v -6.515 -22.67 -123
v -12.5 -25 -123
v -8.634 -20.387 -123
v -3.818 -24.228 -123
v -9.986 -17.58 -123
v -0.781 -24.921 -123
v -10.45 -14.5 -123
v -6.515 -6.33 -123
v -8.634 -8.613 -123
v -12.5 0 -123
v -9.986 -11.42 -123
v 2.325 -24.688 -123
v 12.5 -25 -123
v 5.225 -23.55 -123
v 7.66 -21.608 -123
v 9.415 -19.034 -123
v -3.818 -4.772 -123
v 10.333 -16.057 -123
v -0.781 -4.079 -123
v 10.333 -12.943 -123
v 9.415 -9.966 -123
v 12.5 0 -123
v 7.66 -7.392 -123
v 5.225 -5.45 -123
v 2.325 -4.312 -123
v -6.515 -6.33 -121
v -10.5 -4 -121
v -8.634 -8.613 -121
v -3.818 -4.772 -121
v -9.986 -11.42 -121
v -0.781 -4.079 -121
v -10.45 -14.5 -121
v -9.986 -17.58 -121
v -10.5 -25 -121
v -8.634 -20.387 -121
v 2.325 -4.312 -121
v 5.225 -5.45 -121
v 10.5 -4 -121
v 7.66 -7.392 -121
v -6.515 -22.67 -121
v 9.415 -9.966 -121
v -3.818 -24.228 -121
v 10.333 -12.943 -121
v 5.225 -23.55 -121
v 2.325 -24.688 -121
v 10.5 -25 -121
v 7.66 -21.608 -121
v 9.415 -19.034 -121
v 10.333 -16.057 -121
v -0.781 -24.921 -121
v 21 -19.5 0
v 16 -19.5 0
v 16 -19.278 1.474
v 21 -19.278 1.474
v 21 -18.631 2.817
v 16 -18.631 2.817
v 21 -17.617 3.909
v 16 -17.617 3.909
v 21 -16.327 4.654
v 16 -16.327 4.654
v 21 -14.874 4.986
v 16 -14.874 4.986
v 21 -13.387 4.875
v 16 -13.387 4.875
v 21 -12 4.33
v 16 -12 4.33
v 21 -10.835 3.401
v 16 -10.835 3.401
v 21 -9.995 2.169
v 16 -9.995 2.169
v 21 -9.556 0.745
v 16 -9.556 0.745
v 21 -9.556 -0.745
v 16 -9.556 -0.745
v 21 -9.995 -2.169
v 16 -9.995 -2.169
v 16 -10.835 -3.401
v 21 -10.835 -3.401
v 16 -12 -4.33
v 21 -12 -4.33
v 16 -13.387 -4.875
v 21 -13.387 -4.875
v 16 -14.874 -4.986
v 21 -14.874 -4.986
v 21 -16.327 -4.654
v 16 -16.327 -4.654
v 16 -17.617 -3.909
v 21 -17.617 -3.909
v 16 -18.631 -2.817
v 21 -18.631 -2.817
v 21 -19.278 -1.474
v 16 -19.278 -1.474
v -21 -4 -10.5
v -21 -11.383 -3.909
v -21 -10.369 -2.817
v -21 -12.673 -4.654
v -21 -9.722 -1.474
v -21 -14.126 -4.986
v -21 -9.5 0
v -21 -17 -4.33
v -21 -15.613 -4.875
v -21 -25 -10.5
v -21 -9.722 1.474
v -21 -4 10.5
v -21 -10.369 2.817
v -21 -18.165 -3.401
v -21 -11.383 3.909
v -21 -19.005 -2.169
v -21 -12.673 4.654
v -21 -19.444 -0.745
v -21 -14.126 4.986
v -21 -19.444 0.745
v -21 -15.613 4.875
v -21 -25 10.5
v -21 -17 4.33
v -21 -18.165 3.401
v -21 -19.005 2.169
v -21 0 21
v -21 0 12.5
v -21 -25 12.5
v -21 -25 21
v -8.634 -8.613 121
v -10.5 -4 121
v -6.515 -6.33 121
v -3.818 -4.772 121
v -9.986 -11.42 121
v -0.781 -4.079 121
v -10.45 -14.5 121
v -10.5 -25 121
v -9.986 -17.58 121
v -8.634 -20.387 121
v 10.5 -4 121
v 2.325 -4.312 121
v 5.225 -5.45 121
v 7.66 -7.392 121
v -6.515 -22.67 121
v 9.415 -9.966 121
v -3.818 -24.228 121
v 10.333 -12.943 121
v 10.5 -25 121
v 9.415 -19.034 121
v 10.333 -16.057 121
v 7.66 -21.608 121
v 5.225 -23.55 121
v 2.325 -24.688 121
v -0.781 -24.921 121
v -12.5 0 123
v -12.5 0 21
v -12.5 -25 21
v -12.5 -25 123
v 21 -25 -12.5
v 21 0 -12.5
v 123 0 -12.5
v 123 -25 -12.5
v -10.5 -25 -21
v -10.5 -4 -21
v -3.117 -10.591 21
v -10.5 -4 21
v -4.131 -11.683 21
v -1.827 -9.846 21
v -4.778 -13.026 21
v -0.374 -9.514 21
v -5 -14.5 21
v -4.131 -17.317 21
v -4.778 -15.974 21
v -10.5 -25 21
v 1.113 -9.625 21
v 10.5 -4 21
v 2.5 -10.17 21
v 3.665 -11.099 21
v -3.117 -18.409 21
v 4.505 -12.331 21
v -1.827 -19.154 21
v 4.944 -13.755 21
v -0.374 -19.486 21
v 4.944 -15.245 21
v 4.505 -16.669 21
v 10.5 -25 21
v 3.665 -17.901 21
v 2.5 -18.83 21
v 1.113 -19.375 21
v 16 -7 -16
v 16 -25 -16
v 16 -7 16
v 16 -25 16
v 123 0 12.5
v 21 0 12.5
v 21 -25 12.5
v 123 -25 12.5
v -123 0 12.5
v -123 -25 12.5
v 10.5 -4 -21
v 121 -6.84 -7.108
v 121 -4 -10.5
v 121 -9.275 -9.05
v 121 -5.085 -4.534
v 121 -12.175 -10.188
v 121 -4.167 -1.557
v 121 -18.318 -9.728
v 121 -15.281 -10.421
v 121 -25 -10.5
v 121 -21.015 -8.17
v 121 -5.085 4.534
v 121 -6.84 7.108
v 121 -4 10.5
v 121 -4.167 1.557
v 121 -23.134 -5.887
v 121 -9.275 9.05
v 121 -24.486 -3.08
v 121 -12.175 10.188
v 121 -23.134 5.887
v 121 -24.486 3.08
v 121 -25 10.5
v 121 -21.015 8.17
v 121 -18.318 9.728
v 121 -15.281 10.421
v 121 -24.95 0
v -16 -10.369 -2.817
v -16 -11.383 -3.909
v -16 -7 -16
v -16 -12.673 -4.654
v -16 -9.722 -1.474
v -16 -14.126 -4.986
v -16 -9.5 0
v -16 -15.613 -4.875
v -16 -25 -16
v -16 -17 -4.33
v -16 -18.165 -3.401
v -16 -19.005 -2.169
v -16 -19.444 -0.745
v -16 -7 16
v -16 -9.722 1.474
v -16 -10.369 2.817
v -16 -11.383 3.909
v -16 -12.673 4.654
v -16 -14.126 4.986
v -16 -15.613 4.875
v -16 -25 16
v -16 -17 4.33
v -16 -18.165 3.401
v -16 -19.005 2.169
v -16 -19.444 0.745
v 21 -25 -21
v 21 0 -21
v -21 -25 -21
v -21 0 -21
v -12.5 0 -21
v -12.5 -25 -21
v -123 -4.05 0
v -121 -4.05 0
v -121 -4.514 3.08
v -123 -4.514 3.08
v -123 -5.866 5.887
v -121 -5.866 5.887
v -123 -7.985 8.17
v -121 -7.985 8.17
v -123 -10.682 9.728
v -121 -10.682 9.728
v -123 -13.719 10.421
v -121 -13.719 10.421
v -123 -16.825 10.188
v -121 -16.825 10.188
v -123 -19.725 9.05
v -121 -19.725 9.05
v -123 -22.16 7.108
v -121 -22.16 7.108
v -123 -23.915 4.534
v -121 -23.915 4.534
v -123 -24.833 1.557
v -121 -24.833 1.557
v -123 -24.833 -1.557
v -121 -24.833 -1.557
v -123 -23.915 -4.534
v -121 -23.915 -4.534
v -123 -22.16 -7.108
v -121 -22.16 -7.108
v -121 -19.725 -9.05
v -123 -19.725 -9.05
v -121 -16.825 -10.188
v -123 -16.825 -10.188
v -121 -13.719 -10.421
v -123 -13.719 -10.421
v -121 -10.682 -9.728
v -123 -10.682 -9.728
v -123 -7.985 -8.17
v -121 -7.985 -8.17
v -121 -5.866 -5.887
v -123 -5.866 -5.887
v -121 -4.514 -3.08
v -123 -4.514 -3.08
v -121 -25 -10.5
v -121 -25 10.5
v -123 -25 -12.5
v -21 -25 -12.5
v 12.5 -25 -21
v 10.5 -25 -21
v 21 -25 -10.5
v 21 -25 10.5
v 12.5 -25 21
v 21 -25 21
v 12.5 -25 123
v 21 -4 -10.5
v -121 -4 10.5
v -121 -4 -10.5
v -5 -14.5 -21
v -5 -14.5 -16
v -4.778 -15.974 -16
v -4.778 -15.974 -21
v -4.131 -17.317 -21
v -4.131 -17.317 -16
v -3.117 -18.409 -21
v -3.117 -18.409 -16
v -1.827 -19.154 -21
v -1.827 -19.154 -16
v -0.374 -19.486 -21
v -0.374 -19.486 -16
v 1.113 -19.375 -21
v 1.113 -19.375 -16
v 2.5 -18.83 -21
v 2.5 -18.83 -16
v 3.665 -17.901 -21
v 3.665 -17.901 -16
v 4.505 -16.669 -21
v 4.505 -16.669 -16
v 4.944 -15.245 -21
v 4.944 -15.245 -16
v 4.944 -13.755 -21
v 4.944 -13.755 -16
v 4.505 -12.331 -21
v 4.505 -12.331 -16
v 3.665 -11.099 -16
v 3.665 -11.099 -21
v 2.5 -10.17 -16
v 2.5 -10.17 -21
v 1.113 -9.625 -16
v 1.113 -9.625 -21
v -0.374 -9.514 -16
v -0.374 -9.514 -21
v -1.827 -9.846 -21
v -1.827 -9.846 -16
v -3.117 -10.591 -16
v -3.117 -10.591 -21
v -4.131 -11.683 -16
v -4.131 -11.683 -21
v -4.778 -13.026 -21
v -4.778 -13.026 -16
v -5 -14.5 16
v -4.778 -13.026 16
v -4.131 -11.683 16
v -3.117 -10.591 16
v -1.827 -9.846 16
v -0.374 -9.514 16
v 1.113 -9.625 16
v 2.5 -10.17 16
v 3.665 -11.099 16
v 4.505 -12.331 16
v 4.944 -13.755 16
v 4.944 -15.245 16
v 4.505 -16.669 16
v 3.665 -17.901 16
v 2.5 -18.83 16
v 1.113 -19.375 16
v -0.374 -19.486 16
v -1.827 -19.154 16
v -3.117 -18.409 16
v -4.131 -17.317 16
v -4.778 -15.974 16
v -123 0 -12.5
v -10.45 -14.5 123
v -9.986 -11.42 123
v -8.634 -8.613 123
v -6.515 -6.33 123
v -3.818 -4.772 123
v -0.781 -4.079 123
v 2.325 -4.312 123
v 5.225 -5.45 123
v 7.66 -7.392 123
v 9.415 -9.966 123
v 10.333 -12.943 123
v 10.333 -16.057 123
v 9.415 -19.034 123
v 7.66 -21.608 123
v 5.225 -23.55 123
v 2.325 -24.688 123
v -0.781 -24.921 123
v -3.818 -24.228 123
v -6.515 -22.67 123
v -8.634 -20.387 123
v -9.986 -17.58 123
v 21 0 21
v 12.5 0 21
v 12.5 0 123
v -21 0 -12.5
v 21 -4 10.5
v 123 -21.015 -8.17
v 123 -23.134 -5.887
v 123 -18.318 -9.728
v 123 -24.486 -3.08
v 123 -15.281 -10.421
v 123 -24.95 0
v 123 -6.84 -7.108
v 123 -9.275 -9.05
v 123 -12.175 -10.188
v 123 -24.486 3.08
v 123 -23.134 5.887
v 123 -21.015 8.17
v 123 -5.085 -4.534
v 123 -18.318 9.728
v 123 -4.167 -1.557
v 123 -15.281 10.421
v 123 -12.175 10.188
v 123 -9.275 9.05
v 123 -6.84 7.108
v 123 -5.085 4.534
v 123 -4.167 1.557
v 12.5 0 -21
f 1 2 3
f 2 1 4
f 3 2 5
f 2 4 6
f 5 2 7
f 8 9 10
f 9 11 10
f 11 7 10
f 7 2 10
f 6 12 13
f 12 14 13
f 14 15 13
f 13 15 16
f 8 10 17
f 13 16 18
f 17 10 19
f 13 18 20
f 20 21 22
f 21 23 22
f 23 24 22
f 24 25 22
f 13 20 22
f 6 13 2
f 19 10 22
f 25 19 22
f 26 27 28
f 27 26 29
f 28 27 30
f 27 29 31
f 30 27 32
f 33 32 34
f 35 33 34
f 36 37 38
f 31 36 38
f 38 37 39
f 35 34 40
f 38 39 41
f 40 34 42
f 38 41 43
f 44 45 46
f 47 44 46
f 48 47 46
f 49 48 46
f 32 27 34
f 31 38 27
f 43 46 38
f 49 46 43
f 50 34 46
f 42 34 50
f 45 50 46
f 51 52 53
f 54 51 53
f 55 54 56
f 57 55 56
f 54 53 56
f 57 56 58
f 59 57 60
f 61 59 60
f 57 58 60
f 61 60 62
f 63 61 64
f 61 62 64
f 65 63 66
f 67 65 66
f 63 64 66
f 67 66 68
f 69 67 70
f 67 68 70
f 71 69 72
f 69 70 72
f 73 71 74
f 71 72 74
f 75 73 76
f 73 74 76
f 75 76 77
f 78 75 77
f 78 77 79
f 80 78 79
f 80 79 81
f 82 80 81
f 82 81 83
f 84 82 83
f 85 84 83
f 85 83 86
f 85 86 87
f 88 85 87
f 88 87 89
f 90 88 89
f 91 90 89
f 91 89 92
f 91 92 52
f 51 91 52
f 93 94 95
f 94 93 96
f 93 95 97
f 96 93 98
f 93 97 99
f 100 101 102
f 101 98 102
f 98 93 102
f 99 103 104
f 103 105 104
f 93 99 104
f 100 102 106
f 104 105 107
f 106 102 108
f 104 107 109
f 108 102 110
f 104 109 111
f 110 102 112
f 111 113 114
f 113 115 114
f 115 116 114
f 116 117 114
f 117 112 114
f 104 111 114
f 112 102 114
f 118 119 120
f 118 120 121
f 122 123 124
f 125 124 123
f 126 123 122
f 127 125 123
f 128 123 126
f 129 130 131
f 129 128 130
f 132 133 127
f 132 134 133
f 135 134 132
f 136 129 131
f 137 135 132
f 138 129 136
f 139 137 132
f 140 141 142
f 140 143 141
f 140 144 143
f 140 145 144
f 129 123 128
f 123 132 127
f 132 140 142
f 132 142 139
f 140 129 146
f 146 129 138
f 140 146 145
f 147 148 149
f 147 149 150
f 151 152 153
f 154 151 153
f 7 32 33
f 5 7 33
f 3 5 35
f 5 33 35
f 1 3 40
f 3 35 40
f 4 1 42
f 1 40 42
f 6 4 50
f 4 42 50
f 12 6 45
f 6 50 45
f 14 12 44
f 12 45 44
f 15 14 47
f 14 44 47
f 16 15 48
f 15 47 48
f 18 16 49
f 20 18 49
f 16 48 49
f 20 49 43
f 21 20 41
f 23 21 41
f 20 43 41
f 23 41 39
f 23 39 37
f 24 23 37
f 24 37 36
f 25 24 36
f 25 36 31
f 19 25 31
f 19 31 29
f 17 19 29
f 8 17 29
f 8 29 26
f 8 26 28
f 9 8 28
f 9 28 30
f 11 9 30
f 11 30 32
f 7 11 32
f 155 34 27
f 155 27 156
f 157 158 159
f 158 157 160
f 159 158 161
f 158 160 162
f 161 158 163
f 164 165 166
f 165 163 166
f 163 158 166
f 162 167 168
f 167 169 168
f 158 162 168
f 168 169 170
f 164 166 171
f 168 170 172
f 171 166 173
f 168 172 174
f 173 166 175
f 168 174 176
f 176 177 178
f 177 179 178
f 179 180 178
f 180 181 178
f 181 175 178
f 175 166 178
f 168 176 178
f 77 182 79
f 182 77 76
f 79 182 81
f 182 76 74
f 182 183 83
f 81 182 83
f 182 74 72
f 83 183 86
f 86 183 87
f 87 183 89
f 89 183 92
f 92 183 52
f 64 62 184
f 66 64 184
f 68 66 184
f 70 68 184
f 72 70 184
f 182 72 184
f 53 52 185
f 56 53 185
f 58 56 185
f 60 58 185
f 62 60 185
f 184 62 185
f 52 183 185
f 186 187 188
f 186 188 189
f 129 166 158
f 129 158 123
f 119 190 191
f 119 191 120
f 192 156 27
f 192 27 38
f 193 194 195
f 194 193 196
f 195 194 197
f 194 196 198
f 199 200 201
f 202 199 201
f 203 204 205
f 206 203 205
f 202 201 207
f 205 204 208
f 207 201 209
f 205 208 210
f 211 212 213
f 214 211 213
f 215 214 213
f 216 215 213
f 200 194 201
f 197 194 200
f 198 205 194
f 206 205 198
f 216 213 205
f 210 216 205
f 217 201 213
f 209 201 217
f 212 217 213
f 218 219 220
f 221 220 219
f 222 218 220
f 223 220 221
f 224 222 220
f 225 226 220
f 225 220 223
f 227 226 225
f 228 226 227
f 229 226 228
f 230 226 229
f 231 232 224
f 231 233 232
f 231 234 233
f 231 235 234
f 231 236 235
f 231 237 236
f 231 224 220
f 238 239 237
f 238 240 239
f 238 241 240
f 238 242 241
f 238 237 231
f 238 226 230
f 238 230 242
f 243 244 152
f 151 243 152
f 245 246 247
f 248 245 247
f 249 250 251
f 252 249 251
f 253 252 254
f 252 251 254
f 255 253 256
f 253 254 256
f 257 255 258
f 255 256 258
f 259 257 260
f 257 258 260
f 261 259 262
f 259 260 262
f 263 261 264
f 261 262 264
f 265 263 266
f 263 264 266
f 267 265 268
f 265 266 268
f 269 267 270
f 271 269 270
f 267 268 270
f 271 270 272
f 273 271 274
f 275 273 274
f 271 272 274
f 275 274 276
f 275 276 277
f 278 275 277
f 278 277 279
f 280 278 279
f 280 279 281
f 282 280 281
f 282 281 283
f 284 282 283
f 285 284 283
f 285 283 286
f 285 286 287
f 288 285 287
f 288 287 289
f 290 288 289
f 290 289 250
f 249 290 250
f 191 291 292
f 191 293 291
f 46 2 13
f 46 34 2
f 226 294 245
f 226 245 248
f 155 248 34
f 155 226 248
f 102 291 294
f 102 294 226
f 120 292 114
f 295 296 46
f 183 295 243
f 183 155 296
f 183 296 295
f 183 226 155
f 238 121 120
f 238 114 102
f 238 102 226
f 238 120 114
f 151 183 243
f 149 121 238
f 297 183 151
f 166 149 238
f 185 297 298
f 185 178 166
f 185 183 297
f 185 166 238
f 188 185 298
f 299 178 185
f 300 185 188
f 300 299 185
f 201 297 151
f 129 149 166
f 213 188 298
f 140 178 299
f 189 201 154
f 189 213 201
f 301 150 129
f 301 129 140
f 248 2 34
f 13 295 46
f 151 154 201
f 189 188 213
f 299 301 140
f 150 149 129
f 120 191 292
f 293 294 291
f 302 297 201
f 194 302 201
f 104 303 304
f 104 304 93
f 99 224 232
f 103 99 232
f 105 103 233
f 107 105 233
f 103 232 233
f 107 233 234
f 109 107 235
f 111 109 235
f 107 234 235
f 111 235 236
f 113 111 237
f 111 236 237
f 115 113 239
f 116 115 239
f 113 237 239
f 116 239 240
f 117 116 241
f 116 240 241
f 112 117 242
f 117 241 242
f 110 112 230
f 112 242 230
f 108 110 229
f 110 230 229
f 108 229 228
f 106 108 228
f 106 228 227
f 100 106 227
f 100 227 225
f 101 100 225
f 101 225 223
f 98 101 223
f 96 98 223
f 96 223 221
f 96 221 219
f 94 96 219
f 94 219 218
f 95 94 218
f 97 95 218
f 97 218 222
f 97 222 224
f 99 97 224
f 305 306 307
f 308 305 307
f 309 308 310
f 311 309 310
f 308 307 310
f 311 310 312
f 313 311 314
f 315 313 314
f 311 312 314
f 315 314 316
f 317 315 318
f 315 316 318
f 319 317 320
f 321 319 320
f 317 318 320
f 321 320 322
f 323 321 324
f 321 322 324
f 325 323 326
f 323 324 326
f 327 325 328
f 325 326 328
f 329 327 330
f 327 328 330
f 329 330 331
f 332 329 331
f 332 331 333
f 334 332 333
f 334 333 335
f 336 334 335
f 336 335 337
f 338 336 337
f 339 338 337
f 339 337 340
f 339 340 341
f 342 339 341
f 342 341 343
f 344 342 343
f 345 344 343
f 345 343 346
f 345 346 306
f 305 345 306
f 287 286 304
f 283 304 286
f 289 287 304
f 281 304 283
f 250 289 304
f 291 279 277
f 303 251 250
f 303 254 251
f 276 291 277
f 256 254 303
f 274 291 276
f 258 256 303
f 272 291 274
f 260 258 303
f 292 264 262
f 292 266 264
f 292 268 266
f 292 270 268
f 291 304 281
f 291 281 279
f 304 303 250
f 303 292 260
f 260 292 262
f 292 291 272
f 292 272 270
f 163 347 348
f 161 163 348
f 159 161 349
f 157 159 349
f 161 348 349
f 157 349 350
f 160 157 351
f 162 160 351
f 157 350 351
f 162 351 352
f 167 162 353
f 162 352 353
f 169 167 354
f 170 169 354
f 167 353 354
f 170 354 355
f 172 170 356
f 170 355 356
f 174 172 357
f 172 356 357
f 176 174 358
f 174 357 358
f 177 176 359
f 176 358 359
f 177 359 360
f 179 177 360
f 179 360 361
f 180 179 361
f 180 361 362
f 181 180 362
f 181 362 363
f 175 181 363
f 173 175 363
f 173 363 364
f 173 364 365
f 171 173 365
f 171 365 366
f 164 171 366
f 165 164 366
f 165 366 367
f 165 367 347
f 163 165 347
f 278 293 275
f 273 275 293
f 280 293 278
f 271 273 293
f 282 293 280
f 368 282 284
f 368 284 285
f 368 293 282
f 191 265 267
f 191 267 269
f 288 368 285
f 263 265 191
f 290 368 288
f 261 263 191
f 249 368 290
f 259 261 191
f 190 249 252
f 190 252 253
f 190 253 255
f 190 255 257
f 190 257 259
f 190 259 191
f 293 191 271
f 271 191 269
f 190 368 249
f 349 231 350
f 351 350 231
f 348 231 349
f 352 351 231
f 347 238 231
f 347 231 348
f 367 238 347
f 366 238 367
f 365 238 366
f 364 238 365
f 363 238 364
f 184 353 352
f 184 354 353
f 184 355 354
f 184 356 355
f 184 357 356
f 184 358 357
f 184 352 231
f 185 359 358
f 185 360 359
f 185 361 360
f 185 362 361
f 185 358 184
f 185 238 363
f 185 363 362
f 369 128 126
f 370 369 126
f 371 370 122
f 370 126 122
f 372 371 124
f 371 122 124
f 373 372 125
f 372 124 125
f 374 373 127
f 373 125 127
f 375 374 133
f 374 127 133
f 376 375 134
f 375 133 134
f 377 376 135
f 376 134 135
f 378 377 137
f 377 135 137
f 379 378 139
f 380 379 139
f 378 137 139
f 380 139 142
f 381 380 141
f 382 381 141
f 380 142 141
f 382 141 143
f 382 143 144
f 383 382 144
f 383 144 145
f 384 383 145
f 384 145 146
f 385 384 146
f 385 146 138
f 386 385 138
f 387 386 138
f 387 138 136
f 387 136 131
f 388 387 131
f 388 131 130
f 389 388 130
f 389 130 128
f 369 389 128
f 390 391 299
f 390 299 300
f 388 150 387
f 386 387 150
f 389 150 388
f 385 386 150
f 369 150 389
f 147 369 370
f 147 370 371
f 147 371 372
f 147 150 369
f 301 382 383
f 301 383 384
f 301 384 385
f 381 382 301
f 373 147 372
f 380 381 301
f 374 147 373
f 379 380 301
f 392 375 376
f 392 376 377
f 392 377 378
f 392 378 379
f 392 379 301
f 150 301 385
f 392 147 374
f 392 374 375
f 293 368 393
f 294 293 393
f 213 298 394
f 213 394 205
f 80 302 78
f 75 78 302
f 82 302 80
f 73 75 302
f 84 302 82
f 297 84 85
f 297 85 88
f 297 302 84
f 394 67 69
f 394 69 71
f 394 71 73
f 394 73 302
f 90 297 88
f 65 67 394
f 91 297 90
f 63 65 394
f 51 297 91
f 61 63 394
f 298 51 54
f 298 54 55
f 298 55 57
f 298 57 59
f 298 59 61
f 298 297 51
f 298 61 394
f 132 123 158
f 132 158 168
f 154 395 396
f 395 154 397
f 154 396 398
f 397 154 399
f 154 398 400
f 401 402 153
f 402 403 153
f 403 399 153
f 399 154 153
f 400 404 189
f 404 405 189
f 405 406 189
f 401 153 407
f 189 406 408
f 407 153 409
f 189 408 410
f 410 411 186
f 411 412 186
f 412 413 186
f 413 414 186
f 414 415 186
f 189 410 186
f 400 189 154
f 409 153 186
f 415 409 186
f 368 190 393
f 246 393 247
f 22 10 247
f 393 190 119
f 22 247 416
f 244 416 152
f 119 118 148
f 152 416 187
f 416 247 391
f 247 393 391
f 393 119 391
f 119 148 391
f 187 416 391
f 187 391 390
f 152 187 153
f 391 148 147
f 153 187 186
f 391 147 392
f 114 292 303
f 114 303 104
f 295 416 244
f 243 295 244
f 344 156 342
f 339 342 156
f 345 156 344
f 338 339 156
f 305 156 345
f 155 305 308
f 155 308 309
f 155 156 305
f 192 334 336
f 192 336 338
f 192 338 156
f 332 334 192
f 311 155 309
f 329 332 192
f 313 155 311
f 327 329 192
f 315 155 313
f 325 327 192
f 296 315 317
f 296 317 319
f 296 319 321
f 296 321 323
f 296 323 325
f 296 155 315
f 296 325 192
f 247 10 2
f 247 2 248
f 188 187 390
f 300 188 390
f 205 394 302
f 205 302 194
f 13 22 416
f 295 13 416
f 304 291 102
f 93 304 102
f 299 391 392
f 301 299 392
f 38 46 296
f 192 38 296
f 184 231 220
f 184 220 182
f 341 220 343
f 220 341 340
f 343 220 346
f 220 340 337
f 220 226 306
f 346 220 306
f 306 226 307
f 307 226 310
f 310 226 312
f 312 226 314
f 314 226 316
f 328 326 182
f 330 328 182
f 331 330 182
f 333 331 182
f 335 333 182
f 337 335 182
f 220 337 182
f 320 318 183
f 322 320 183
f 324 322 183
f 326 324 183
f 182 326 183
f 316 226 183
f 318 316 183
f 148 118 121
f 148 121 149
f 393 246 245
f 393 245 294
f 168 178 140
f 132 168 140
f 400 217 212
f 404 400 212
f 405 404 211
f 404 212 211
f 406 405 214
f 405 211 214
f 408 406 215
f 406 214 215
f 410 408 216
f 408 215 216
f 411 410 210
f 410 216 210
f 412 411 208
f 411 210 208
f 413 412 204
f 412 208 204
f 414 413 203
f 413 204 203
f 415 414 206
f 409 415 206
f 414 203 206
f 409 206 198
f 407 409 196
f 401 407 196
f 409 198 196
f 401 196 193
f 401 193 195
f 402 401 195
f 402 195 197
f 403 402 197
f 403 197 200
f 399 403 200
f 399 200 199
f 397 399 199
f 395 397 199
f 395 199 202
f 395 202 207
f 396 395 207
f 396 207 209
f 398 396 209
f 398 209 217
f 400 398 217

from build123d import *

# Parameters (mm, degrees)
F0_W      = 42
F0_H      = 42
F0_W_2    = 32
F0_H_2    = 32
F5_DEPTH  = 25
F1_W      = 25
F1_H      = 102
F2_W      = 102
F2_H      = 25
F3_W      = 102
F3_H      = 25
F4_W      = 25
F4_H      = 102
F6_DEPTH  = 25
F7_W      = 32
F7_H      = 32
F8_DEPTH  = 18
F9_W      = 100
F9_H      = 21
F10_DEPTH = 21
F11_W     = 100
F11_H     = 21
F12_DEPTH = 21
F13_W     = 21
F13_H     = 100
F14_DEPTH = 21
F15_W     = 21
F15_H     = 100
F16_DEPTH = 21
F18_D     = 10
F18_DEPTH = 11
F20_D     = 10
F20_DEPTH = 11
F22_D     = 10
F22_DEPTH = 11
F24_D     = 10
F24_DEPTH = 11
F26_D     = 20.9
F26_DEPTH = 3
F28_D     = 20.9
F28_DEPTH = 3
F30_D     = 20.9
F30_DEPTH = 3
F32_D     = 20.9
F32_DEPTH = 3


with BuildPart() as f5:
    # F0 (on Front) → F5 (new body)
    with BuildSketch(Plane.XZ):
        Rectangle(F0_W, F0_H)
        Rectangle(F0_W_2, F0_H_2, mode=Mode.SUBTRACT)
        Rectangle(F0_W_2, F0_H_2)
    extrude(amount=F5_DEPTH)

    # F1 (on Front) + F2 (on Front) + F3 (on Front) + F4 (on Front) → F6 (join)
    with BuildSketch(Plane.XZ):
        with Locations((0, -72)):
            Rectangle(F1_W, F1_H)
    with BuildSketch(Plane.XZ):
        with Locations((-72, 0)):
            Rectangle(F2_W, F2_H)
    with BuildSketch(Plane.XZ):
        with Locations((72, 0)):
            Rectangle(F3_W, F3_H)
    with BuildSketch(Plane.XZ):
        with Locations((0, 72)):
            Rectangle(F4_W, F4_H)
    extrude(amount=F6_DEPTH)

    # F7 (on face) → F8 (cut)
    with BuildSketch(Plane.XZ.offset(25)):
        Rectangle(F7_W, F7_H)
    extrude(amount=-F8_DEPTH, mode=Mode.SUBTRACT)

    # F9 (on face) → F10 (cut)
    with BuildSketch(Plane.XZ.offset(25)):
        with Locations((-71, 0)):
            Rectangle(F9_W, F9_H)
    extrude(amount=-F10_DEPTH, mode=Mode.SUBTRACT)

    # F11 (on face) → F12 (cut)
    with BuildSketch(Plane.XZ.offset(25)):
        with Locations((71, 0)):
            Rectangle(F11_W, F11_H)
    extrude(amount=-F12_DEPTH, mode=Mode.SUBTRACT)

    # F13 (on face) → F14 (cut)
    with BuildSketch(Plane.XZ.offset(25)):
        with Locations((0, 71)):
            Rectangle(F13_W, F13_H)
    extrude(amount=-F14_DEPTH, mode=Mode.SUBTRACT)

    # F15 (on face) → F16 (cut)
    with BuildSketch(Plane.XZ.offset(25)):
        with Locations((0, -71)):
            Rectangle(F15_W, F15_H)
    extrude(amount=-F16_DEPTH, mode=Mode.SUBTRACT)

    # F18
    with Locations(Plane.YZ.offset(21)):
        with Locations((-14.5, 0)):
            Hole(F18_D / 2, depth=F18_DEPTH)

    # F20
    with Locations(Plane(origin=(0, 0, -21), x_dir=(1, 0, 0), z_dir=(0, 0, -1))):
        with Locations((0, 14.5)):
            Hole(F20_D / 2, depth=F20_DEPTH)

    # F22
    with Locations(Plane.XY.offset(21)):
        with Locations((0, -14.5)):
            Hole(F22_D / 2, depth=F22_DEPTH)

    # F24
    with Locations(Plane(origin=(-21, 0, 0), x_dir=(0, -1, 0), z_dir=(-1, 0, 0))):
        with Locations((14.5, 0)):
            Hole(F24_D / 2, depth=F24_DEPTH)

    # F26
    with Locations(Plane(origin=(-123, 0, 0), x_dir=(0, -1, 0), z_dir=(-1, 0, 0))):
        with Locations((14.5, 0)):
            Hole(F26_D / 2, depth=F26_DEPTH)

    # F28
    with Locations(Plane.XY.offset(123)):
        with Locations((0, -14.5)):
            Hole(F28_D / 2, depth=F28_DEPTH)

    # F30
    with Locations(Plane(origin=(0, 0, -123), x_dir=(1, 0, 0), z_dir=(0, 0, -1))):
        with Locations((0, 14.5)):
            Hole(F30_D / 2, depth=F30_DEPTH)

    # F32
    with Locations(Plane.YZ.offset(123)):
        with Locations((-14.5, 0)):
            Hole(F32_D / 2, depth=F32_DEPTH)


solid = f5.part
